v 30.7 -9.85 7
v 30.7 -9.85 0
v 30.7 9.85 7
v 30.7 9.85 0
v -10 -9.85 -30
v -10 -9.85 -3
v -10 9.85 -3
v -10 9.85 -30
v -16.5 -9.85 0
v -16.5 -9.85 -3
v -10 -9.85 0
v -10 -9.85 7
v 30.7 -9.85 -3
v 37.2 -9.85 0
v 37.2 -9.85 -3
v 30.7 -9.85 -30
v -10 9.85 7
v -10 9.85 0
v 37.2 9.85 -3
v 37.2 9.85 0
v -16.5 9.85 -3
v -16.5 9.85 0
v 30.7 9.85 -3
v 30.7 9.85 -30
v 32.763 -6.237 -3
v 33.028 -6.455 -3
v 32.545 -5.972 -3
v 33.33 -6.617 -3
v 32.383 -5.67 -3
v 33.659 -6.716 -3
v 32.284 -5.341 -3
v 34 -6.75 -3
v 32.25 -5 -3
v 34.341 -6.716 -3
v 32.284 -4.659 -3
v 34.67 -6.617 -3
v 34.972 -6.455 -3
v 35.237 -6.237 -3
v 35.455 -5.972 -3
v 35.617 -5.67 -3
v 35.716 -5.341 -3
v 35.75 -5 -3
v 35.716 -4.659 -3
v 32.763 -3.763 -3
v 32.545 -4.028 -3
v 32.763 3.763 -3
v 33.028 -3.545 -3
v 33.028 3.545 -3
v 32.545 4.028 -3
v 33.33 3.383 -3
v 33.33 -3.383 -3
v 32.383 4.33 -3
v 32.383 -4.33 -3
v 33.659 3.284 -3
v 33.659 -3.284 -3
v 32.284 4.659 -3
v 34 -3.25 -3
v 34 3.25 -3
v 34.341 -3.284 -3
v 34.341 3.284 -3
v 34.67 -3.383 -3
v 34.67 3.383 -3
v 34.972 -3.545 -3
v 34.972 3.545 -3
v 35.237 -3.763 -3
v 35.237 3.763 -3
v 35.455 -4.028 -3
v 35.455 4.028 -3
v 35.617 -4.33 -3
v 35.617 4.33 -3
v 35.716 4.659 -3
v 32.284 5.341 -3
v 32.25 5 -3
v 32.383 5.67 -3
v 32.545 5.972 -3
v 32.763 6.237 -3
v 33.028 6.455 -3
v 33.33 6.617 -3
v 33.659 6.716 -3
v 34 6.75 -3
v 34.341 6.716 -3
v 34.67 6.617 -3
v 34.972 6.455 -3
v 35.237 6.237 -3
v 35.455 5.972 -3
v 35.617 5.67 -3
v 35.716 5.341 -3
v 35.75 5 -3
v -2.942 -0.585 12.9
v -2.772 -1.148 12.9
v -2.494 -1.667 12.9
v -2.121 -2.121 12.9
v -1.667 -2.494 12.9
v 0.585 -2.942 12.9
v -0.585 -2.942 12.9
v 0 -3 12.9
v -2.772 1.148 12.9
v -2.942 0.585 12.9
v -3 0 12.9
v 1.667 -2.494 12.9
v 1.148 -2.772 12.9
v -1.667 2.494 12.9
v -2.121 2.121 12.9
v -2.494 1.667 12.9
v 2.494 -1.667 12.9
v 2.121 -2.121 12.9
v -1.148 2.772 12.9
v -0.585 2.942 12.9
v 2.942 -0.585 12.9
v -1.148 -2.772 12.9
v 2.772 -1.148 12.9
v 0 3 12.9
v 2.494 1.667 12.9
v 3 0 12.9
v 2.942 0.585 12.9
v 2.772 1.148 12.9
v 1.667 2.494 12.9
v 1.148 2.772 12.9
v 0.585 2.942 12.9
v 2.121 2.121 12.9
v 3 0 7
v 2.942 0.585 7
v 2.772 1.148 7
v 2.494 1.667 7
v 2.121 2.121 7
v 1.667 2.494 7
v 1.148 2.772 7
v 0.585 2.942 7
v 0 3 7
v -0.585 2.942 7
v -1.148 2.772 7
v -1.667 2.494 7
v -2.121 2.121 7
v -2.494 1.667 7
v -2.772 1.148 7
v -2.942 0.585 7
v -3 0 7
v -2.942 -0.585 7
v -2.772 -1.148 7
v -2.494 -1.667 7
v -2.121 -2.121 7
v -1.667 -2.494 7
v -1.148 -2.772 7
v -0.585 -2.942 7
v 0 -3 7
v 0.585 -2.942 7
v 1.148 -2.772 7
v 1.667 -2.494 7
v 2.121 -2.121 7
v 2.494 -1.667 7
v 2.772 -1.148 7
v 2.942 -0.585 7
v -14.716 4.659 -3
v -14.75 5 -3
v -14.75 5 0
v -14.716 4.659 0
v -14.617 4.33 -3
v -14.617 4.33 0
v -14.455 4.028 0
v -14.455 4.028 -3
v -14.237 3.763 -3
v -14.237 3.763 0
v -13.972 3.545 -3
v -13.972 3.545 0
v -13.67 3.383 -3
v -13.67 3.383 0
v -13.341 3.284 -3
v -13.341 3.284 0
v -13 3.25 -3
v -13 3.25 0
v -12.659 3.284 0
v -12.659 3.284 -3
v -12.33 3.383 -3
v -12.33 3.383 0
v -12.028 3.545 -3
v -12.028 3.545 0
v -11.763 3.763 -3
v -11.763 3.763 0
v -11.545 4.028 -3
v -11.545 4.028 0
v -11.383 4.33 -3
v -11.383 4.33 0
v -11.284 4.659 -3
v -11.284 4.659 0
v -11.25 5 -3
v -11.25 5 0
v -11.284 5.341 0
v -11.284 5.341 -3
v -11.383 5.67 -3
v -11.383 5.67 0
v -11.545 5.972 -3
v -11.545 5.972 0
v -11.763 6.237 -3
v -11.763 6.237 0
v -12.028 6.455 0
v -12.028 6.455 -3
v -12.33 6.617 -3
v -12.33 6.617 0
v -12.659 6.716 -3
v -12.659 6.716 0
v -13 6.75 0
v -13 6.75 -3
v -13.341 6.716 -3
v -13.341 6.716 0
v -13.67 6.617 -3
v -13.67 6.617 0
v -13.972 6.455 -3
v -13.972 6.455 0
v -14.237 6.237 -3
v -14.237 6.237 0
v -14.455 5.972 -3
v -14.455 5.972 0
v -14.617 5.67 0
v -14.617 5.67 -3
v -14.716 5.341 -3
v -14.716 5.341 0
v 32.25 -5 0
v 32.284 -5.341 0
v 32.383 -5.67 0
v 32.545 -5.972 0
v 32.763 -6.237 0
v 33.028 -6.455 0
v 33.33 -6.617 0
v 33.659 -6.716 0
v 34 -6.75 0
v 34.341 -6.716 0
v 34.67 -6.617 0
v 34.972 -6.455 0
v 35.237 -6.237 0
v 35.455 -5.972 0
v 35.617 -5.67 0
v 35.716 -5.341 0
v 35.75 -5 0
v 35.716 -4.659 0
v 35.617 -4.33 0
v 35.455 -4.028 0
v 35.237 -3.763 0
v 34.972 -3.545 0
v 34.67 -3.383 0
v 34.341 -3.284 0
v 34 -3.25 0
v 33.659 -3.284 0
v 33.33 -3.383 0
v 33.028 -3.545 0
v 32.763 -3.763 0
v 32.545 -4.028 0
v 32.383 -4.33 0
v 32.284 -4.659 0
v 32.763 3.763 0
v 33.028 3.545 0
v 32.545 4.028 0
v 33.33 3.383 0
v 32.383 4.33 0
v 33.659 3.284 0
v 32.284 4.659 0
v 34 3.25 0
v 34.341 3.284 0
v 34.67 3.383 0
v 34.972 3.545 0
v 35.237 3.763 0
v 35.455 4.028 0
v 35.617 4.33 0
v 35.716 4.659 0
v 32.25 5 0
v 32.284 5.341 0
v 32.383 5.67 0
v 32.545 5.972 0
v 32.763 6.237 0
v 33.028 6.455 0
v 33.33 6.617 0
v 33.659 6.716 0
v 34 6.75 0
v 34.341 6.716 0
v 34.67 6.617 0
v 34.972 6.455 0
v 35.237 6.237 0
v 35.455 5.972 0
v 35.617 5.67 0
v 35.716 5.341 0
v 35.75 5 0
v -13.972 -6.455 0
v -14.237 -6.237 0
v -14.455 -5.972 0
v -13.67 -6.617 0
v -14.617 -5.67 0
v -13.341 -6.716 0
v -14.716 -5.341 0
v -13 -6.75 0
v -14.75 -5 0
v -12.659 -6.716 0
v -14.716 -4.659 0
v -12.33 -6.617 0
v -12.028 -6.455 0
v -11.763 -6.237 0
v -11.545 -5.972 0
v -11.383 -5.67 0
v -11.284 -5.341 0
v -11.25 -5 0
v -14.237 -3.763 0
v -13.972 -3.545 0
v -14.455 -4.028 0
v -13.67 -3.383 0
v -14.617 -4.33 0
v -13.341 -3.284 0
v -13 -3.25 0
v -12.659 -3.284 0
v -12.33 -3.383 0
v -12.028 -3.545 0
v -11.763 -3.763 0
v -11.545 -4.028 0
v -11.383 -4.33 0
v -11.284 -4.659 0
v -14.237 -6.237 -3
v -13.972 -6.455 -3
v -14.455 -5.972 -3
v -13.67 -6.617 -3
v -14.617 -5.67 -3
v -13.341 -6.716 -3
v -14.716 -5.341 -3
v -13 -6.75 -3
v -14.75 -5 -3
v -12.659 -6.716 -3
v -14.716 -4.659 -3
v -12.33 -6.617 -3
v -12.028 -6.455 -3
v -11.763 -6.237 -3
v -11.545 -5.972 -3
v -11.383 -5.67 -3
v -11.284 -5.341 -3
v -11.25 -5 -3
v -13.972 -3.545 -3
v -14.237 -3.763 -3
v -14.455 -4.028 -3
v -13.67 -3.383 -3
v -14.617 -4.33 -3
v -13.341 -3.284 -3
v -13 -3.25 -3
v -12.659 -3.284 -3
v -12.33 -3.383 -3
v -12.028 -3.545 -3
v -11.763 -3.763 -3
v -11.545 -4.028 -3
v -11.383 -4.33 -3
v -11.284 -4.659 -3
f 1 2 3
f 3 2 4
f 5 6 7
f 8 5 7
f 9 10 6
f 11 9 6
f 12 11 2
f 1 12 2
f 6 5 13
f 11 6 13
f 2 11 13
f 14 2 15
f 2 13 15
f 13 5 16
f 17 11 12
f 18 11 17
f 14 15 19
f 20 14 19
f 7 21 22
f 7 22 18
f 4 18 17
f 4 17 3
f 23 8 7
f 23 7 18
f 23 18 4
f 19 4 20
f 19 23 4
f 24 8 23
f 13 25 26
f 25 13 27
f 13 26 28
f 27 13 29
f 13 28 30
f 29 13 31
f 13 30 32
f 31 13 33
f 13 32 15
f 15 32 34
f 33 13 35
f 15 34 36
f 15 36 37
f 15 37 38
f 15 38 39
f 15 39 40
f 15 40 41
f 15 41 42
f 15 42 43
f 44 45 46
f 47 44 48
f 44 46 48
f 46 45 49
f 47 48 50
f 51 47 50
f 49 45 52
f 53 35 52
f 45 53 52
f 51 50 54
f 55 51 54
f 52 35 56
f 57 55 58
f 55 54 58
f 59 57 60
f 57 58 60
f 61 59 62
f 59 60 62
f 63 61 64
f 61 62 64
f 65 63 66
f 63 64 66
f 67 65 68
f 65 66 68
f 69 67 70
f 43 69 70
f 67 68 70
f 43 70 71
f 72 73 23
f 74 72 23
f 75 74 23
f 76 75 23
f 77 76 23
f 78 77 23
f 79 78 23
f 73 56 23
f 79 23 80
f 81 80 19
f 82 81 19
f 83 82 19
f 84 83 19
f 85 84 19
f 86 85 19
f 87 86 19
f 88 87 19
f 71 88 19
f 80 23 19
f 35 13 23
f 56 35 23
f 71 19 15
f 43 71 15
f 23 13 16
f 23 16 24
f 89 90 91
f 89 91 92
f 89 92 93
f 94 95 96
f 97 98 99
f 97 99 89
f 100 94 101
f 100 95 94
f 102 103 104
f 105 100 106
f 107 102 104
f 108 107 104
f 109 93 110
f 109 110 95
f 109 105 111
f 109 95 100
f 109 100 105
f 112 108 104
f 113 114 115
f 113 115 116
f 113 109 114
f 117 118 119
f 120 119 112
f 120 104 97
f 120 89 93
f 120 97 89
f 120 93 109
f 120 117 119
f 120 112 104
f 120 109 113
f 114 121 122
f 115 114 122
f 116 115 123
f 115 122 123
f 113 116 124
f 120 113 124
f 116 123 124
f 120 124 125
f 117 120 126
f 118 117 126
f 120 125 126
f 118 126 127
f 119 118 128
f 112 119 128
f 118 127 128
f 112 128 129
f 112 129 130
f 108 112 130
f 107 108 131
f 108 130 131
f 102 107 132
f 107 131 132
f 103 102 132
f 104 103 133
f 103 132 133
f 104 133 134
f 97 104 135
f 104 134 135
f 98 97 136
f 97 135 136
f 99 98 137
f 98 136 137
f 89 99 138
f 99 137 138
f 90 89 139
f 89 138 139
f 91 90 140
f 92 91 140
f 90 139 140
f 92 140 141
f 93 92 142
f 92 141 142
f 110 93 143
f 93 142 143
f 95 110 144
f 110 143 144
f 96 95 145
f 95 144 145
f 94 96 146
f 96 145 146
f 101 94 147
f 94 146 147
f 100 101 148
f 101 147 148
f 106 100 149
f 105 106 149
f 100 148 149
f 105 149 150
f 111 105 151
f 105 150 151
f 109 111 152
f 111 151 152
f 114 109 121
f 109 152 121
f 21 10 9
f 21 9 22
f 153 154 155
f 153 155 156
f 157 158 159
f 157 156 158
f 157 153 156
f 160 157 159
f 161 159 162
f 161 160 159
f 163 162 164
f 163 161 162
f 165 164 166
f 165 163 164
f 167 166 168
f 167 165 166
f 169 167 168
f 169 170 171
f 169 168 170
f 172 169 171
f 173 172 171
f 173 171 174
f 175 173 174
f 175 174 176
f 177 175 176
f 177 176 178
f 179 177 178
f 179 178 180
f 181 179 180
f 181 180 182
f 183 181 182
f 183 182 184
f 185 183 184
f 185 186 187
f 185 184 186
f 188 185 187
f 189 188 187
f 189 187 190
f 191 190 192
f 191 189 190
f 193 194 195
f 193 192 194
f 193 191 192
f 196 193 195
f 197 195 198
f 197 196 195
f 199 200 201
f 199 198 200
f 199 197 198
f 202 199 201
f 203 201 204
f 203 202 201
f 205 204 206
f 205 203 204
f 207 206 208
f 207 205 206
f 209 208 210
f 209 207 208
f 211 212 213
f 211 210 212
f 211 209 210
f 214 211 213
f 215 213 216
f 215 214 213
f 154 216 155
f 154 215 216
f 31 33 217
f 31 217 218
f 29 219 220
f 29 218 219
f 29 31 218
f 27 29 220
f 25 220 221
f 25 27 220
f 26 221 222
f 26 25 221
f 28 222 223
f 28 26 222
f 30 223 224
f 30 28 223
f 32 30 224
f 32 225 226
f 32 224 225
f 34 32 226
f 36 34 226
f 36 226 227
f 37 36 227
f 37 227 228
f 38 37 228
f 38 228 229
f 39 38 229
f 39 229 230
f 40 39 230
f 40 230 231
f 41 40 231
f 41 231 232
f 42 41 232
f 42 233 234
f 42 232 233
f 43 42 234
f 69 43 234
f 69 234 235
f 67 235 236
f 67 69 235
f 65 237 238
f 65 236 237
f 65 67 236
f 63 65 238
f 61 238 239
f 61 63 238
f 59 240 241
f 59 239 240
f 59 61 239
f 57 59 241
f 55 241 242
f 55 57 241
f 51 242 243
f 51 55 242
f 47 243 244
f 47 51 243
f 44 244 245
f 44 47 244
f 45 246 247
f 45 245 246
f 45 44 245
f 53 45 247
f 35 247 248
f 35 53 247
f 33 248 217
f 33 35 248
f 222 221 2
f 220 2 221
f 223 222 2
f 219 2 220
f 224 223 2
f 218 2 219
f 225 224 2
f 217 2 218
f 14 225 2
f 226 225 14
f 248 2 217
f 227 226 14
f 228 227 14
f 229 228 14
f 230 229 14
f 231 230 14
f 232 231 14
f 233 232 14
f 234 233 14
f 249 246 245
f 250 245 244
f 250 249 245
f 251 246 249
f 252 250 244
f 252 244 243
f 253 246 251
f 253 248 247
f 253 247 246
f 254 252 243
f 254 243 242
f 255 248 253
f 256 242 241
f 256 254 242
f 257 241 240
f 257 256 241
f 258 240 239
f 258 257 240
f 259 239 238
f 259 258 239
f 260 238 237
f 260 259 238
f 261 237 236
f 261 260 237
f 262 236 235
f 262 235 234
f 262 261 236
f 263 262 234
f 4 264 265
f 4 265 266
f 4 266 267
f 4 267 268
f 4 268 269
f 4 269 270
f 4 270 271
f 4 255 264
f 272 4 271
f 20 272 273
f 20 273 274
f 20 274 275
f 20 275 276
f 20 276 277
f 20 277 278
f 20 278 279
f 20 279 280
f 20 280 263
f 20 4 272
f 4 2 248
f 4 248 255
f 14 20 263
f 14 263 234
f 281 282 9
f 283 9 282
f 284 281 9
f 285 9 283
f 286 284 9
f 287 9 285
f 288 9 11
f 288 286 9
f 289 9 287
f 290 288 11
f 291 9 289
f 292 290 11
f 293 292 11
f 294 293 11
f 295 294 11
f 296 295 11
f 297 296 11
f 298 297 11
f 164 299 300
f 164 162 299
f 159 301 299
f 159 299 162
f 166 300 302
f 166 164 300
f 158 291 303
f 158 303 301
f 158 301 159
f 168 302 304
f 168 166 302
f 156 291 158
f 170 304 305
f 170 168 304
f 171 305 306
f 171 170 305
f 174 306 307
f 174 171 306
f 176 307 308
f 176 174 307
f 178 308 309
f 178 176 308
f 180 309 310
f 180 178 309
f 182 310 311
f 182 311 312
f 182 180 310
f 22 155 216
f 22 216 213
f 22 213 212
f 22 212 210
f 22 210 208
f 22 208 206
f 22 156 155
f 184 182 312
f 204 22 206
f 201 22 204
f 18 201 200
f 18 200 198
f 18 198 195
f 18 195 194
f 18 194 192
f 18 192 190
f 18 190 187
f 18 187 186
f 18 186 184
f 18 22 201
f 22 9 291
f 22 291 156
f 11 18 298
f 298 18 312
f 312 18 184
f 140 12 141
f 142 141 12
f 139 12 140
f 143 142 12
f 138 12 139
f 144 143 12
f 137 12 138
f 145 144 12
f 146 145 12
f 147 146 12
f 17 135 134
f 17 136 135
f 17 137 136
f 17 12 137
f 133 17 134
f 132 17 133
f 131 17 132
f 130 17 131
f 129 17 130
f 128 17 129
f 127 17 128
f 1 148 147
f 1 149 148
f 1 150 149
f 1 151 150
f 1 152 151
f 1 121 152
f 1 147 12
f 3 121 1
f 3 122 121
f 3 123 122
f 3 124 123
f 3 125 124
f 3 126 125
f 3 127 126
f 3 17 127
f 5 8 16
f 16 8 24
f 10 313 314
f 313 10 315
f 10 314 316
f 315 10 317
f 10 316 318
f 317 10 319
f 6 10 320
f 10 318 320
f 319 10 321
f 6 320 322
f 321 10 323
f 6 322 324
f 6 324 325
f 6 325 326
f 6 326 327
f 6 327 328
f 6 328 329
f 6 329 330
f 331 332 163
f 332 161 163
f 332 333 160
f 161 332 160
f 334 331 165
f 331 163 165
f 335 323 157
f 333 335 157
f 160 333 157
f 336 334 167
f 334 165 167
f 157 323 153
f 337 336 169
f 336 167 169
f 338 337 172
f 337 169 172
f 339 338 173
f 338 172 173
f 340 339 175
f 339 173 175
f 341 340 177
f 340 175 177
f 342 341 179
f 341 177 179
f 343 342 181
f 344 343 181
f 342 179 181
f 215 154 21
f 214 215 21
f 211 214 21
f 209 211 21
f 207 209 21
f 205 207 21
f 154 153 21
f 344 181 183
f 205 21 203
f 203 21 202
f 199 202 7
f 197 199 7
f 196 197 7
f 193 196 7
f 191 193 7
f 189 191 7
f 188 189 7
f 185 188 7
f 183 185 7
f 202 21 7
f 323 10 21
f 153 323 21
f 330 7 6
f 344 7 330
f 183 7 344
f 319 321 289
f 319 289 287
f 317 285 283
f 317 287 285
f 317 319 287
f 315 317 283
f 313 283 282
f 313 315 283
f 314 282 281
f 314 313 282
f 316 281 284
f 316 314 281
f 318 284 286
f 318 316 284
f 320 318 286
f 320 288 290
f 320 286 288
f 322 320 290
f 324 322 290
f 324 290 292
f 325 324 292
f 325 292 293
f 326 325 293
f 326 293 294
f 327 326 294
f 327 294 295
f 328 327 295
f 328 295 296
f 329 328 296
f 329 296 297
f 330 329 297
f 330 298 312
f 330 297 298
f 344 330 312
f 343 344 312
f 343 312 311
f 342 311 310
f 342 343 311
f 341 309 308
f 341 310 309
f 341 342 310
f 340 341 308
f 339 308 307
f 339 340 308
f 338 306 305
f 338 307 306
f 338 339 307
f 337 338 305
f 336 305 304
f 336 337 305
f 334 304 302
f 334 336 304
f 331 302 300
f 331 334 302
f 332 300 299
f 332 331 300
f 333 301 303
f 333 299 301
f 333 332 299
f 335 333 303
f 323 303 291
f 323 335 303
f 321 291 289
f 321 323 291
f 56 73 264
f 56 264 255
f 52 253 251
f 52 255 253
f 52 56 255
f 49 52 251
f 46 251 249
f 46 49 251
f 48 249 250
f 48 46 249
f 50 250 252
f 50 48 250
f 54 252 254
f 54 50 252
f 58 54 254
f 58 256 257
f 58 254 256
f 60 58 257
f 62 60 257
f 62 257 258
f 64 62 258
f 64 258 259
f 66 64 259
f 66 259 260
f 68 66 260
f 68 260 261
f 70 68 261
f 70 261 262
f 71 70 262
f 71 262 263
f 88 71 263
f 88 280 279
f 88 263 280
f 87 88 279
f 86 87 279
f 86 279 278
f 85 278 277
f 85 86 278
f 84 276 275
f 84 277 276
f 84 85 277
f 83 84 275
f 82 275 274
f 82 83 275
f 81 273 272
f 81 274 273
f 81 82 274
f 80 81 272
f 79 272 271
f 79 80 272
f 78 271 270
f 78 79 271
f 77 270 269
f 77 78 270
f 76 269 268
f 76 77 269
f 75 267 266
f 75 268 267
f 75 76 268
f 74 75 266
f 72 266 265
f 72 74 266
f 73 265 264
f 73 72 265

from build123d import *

# Parameters (mm, degrees)
CASE_40P7X19P7_START                 = -30
CASE_40P7X19P7_PROFILE_W             = 40.7
CASE_40P7X19P7_PROFILE_H             = 19.7
CASE_40P7X19P7_DEPTH                 = 37
MOUNTING_FLANGE_NOMINAL_START        = -3
MOUNTING_FLANGE_NOMINAL_PROFILE_W    = 53.7
MOUNTING_FLANGE_NOMINAL_PROFILE_H    = 19.7
MOUNTING_FLANGE_NOMINAL_DEPTH        = 3
OUTPUT_ENVELOPE_NOT_SPLINE_START     = 7
OUTPUT_ENVELOPE_NOT_SPLINE_PROFILE_R = 3
OUTPUT_ENVELOPE_NOT_SPLINE_DEPTH     = 5.9
TAB_HOLES_NOMINAL_START              = -50
TAB_HOLES_NOMINAL_PROFILE_R          = 1.75
TAB_HOLES_NOMINAL_DEPTH              = 99.794082633


with BuildPart() as part:
    # Case_40p7x19p7_profile → Case_40p7x19p7 (new body)
    with BuildSketch(Plane.XY.offset(CASE_40P7X19P7_START)):
        with Locations((10.35, 0)):
            Rectangle(CASE_40P7X19P7_PROFILE_W, CASE_40P7X19P7_PROFILE_H)
    extrude(amount=CASE_40P7X19P7_DEPTH)

    # Mounting_flange_nominal_profile → Mounting_flange_nominal (add)
    with BuildSketch(Plane.XY.offset(MOUNTING_FLANGE_NOMINAL_START)):
        with Locations((10.35, 0)):
            Rectangle(MOUNTING_FLANGE_NOMINAL_PROFILE_W, MOUNTING_FLANGE_NOMINAL_PROFILE_H)
    extrude(amount=MOUNTING_FLANGE_NOMINAL_DEPTH)

    # Output_envelope_not_spline_profile → Output_envelope_not_spline (add)
    with BuildSketch(Plane.XY.offset(OUTPUT_ENVELOPE_NOT_SPLINE_START)):
        Circle(OUTPUT_ENVELOPE_NOT_SPLINE_PROFILE_R)
    extrude(amount=OUTPUT_ENVELOPE_NOT_SPLINE_DEPTH)

    # Tab_holes_nominal_profile → Tab_holes_nominal (cut, through all)
    with BuildSketch(Plane.XY.offset(TAB_HOLES_NOMINAL_START)):
        with Locations(Location((-13, 5, 0), (0, 0, 180))):
            Circle(TAB_HOLES_NOMINAL_PROFILE_R)
        with Locations(Location((-13, -5, 0), (0, 0, 180))):
            Circle(TAB_HOLES_NOMINAL_PROFILE_R)
        with Locations(Location((34, 5, 0), (0, 0, 180))):
            Circle(TAB_HOLES_NOMINAL_PROFILE_R)
        with Locations(Location((34, -5, 0), (0, 0, 180))):
            Circle(TAB_HOLES_NOMINAL_PROFILE_R)
    extrude(amount=TAB_HOLES_NOMINAL_DEPTH, mode=Mode.SUBTRACT)


solid = part.part
